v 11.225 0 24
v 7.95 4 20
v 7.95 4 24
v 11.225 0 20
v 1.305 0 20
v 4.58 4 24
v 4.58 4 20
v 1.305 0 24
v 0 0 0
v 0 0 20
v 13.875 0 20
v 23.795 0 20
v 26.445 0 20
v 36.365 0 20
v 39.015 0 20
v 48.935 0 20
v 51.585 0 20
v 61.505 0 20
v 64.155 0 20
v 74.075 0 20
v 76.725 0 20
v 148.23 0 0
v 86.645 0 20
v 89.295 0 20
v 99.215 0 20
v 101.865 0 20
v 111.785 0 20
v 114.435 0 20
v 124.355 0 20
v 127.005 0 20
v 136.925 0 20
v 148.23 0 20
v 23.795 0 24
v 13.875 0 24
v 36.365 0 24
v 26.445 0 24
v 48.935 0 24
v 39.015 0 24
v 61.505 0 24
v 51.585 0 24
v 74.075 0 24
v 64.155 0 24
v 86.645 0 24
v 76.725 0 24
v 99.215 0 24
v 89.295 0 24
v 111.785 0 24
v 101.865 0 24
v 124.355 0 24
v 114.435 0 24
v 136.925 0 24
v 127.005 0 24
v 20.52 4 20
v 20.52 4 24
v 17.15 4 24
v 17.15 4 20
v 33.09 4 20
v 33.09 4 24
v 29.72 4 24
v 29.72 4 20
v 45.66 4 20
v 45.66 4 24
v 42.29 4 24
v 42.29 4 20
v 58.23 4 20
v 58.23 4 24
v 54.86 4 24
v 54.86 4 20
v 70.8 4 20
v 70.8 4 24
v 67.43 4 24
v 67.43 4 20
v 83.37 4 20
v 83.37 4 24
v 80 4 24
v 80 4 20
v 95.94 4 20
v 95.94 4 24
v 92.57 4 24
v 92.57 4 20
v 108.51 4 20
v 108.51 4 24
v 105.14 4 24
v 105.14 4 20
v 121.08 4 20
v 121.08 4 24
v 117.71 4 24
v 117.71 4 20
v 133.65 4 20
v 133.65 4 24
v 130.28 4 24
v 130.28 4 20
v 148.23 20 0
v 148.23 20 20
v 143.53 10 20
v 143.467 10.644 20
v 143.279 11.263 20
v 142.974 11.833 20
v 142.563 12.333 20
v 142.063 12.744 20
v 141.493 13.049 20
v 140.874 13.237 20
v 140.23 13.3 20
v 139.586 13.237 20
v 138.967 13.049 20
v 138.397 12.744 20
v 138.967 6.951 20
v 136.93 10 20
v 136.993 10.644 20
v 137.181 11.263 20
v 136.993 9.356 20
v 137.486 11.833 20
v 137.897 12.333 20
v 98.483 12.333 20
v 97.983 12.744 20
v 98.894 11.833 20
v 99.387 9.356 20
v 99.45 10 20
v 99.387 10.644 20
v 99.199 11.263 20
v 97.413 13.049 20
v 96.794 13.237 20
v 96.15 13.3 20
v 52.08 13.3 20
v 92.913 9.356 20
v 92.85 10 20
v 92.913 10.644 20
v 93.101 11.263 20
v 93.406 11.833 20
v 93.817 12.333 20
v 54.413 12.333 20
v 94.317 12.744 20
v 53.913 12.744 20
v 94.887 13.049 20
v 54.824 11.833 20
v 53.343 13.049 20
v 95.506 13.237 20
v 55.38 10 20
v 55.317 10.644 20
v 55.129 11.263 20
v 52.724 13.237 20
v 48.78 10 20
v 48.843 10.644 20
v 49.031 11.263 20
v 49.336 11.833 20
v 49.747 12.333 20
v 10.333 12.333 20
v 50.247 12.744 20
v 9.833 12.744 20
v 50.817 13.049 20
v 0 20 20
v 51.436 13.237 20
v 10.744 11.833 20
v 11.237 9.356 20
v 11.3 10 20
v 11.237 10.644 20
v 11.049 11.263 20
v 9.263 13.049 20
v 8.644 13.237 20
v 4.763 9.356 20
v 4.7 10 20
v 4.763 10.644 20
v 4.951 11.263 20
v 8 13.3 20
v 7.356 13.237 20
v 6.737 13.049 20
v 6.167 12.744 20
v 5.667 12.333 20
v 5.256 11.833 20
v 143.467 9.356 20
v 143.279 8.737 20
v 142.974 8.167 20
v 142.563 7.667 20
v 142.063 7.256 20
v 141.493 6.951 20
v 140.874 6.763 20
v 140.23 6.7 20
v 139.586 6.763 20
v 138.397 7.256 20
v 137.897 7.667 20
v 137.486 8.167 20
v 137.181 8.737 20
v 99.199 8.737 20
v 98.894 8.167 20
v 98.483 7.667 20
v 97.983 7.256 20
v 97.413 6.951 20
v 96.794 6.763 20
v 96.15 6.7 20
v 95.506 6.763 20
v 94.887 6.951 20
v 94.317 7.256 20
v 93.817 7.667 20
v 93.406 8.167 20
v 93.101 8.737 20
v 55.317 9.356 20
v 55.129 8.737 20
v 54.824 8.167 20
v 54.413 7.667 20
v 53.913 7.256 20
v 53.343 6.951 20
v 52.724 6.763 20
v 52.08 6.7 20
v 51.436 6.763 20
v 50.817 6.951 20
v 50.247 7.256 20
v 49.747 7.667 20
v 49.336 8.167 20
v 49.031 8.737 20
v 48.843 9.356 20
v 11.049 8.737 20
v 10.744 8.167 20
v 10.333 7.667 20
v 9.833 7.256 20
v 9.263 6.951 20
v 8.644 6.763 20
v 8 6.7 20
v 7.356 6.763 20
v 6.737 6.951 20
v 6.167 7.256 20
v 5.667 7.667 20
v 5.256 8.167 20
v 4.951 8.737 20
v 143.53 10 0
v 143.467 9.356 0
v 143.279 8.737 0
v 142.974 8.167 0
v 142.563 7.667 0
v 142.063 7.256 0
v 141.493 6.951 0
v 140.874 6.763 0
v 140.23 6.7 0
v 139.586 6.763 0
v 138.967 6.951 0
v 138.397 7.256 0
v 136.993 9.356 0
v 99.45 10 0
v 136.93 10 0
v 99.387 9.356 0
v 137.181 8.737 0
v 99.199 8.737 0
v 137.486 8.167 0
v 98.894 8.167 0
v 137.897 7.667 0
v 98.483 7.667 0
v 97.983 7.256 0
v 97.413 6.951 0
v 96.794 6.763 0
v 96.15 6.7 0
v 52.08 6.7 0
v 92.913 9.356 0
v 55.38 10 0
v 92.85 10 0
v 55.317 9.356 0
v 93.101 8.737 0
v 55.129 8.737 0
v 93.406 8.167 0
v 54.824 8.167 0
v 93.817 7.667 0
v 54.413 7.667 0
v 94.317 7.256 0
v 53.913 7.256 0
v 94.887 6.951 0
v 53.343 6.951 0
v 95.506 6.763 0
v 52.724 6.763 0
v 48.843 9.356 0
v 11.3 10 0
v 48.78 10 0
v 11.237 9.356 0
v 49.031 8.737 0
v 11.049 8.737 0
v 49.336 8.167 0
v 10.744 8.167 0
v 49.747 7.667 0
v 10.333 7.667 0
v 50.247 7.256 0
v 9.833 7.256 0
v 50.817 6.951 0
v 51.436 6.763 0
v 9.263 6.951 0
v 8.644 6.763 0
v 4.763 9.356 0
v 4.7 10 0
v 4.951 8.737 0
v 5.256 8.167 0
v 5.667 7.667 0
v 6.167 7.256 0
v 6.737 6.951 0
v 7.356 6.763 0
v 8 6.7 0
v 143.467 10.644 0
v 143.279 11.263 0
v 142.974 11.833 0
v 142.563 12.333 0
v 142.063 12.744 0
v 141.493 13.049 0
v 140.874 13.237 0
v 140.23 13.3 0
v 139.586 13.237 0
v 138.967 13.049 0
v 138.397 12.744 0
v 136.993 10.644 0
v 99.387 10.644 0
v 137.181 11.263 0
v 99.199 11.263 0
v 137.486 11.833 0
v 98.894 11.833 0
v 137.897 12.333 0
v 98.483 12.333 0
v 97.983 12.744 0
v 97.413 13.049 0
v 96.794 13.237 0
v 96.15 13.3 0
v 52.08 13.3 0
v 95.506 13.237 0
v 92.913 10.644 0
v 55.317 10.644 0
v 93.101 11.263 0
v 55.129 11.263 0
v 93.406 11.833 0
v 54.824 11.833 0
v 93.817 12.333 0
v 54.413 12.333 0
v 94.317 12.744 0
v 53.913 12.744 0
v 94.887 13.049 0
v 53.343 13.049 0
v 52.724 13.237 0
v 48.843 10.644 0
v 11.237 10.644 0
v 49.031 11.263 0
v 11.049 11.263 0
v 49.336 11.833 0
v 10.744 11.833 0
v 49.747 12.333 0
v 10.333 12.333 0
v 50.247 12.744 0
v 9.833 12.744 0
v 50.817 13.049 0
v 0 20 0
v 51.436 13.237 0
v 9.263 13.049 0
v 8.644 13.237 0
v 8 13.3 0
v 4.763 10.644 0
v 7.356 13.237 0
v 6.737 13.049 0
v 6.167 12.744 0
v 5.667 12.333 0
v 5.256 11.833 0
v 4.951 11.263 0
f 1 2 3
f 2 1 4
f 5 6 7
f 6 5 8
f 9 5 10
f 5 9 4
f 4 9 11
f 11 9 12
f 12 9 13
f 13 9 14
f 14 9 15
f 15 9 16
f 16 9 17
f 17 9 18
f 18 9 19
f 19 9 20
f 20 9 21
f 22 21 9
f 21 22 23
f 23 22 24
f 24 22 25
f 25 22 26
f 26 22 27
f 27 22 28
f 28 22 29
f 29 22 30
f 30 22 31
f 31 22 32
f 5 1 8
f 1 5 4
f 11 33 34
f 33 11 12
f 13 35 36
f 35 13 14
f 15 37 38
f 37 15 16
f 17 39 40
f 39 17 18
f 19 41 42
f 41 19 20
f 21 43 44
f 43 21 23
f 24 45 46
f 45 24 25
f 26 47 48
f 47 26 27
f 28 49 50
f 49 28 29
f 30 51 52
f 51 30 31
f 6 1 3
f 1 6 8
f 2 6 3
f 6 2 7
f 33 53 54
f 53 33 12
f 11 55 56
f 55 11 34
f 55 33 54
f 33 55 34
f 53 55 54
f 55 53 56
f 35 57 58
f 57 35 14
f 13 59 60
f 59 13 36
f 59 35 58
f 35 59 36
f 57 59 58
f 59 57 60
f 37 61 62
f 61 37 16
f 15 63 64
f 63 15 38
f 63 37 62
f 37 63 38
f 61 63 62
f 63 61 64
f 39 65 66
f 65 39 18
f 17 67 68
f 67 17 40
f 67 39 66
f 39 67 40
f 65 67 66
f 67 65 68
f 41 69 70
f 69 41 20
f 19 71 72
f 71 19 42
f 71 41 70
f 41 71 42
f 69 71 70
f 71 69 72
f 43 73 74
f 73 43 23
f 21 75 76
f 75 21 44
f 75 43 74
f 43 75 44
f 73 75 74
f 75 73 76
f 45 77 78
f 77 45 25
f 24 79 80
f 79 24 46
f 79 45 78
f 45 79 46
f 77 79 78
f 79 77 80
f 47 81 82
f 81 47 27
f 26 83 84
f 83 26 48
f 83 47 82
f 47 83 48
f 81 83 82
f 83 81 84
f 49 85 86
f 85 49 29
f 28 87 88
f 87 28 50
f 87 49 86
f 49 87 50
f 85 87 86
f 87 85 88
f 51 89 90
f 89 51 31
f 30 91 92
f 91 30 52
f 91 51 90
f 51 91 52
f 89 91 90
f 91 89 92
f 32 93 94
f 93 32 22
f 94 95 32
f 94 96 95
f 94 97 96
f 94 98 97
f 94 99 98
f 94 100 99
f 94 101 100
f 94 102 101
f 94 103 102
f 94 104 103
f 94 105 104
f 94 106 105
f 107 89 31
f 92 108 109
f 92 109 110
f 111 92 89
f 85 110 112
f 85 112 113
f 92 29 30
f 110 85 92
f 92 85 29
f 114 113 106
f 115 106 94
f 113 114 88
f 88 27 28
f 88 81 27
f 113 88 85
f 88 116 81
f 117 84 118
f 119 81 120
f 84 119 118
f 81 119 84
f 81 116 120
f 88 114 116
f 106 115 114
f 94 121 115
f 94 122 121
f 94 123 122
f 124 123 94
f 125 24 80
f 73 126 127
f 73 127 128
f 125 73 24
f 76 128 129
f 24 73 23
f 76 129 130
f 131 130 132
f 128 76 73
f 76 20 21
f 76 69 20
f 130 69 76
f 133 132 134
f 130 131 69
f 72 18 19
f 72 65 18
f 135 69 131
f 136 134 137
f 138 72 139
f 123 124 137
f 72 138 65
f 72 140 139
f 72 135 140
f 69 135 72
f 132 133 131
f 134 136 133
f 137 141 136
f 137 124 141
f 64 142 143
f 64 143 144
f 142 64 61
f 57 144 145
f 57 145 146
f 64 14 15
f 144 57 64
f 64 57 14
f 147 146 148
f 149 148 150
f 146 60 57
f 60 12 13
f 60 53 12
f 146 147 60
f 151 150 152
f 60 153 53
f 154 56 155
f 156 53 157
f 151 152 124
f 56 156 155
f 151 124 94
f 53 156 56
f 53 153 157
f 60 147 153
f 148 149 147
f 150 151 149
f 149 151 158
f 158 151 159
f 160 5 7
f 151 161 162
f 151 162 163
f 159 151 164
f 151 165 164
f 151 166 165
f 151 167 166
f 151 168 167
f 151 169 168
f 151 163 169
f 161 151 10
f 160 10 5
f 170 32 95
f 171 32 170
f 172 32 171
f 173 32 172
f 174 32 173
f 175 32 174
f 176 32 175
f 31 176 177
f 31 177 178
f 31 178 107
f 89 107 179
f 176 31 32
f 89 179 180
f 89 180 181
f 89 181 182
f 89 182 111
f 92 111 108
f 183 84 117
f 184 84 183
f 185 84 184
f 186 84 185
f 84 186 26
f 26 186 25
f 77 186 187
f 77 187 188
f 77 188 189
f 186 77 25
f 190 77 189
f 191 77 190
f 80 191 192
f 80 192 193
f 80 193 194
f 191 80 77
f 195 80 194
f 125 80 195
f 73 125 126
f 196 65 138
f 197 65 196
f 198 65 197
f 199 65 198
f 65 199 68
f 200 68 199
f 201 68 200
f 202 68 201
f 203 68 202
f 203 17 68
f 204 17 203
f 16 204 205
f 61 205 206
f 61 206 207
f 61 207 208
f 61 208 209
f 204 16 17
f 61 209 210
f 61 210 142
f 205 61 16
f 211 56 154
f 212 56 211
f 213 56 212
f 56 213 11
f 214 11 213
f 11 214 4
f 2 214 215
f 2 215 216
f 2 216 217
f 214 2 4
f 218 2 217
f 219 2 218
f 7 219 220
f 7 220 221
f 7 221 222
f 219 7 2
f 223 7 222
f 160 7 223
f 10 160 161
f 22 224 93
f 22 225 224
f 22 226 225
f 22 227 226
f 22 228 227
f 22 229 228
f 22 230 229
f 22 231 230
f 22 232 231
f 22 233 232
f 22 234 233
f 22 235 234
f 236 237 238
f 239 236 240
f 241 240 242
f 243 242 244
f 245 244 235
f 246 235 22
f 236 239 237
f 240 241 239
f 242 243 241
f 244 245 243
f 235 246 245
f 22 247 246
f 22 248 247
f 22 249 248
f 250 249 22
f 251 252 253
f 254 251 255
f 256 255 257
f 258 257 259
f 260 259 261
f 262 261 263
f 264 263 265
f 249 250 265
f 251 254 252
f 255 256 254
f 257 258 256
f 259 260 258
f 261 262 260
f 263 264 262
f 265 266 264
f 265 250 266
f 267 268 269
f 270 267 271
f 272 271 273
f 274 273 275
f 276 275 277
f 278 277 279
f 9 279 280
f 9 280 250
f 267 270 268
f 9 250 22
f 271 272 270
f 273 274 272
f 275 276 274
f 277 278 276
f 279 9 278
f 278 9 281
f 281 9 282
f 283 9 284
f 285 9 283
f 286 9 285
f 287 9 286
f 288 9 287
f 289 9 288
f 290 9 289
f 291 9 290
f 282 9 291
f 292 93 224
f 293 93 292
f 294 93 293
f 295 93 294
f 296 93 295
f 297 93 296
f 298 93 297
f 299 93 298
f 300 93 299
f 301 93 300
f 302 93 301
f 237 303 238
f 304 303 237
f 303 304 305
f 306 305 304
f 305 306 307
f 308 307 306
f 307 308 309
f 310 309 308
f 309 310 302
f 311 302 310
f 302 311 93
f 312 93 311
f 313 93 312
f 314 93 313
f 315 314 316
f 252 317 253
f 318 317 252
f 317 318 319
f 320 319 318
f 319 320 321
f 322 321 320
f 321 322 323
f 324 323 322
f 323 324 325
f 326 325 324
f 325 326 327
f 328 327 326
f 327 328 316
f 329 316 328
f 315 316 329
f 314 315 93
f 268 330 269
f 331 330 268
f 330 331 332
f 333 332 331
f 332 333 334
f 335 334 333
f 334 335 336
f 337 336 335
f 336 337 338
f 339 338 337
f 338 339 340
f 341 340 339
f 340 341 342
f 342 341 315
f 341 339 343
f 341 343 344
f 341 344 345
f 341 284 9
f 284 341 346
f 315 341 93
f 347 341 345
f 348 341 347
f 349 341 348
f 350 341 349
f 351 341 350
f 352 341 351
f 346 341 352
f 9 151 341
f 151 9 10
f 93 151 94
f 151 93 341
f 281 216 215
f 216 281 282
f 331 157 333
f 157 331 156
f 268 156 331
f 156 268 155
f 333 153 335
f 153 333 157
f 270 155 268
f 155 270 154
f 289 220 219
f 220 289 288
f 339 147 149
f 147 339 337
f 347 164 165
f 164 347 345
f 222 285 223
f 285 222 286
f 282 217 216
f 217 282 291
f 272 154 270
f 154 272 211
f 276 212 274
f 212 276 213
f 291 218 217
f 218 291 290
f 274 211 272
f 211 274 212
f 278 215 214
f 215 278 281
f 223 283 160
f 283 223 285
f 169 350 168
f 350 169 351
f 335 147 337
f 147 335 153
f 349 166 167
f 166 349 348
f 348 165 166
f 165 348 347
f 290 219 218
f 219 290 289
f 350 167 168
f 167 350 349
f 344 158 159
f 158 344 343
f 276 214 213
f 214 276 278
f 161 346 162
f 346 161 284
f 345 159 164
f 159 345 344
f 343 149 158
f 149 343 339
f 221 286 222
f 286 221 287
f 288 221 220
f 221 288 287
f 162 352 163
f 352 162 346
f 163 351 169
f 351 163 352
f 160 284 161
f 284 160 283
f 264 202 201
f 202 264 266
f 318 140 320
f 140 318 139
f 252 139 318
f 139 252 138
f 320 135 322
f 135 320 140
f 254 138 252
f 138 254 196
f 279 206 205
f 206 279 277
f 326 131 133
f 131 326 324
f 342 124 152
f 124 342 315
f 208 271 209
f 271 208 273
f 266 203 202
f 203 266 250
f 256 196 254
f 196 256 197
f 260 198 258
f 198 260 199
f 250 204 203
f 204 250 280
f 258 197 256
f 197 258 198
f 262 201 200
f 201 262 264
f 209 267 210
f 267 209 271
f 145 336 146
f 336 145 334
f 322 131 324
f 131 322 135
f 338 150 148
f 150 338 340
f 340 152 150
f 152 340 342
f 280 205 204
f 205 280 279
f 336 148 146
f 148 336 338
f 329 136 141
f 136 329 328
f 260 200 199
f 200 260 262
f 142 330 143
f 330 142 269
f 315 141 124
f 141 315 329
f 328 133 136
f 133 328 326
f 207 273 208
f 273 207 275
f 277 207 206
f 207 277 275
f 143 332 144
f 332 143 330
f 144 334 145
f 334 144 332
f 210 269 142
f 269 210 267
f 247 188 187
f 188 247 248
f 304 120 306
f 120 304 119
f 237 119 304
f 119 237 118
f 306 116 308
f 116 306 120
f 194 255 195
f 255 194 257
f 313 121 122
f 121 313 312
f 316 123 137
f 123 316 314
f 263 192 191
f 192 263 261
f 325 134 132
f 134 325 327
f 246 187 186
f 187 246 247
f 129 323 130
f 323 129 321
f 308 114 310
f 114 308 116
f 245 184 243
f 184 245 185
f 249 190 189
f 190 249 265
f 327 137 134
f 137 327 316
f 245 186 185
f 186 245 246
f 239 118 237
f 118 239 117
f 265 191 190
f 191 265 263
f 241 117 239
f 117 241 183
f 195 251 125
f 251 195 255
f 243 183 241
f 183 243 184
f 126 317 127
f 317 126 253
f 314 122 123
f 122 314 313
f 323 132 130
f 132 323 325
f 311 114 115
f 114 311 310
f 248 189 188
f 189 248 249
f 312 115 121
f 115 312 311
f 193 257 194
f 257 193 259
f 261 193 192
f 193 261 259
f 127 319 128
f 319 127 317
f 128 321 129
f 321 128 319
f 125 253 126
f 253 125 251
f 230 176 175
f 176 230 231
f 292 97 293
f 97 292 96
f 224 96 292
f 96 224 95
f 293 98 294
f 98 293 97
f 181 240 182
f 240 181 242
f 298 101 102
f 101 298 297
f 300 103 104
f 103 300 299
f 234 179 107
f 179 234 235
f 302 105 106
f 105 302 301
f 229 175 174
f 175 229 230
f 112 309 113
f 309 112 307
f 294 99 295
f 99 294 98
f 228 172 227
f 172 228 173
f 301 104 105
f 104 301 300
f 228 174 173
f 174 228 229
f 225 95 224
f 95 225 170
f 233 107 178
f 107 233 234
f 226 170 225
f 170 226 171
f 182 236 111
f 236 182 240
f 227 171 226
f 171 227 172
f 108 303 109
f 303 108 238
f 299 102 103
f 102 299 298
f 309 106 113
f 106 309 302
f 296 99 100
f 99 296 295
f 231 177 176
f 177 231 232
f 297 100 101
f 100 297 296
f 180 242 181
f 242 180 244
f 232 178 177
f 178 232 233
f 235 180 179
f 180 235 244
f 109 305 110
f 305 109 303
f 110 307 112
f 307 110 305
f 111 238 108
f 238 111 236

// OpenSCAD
$fn = 32;

// ----------------------------------------------------------------------
// Gear rack: m=4 z=11, 148.23 x 20 x 24 mm
// ----------------------------------------------------------------------

// --- parameters (mm) ---
rack_len = 148.23;        // rack length, X
rack_w = 20;              // rack width, Y
rack_h = 24;              // overall height, Z
modul = 4;                // module
body_t = 20;              // tooth root line height
pitch = 12.57;            // circular pitch
tip_w = 3.37;             // tooth thickness at the tip
root_w = 9.92;            // tooth thickness at the root line
hole_d = 6.6;             // mounting hole
sink = 0.6;               // tooth root overlap into the body

tooth_span = 138.23;

module tooth(x0) {
  /* 20 deg flank profile, sunk into the body for a positive overlap */
  translate([x0, 0, body_t - sink])
    linear_extrude(height = rack_h - body_t + sink)
      polygon(points = [[-root_w / 2, 0], [root_w / 2, 0],
                        [tip_w / 2, rack_h - body_t],
                        [-tip_w / 2, rack_h - body_t]]);
}

difference() {
  union() {
    cube([rack_len, rack_w, body_t]);
    for (i = [0 : 11 - 1])
      tooth((i + 0.5) * pitch + (tooth_span - 11 * pitch) / 2);
  }
  translate([8, 10, -1]) cylinder(h = body_t + 2, d = hole_d);
  translate([52.08, 10, -1]) cylinder(h = body_t + 2, d = hole_d);
  translate([96.15, 10, -1]) cylinder(h = body_t + 2, d = hole_d);
  translate([140.23, 10, -1]) cylinder(h = body_t + 2, d = hole_d);
}
